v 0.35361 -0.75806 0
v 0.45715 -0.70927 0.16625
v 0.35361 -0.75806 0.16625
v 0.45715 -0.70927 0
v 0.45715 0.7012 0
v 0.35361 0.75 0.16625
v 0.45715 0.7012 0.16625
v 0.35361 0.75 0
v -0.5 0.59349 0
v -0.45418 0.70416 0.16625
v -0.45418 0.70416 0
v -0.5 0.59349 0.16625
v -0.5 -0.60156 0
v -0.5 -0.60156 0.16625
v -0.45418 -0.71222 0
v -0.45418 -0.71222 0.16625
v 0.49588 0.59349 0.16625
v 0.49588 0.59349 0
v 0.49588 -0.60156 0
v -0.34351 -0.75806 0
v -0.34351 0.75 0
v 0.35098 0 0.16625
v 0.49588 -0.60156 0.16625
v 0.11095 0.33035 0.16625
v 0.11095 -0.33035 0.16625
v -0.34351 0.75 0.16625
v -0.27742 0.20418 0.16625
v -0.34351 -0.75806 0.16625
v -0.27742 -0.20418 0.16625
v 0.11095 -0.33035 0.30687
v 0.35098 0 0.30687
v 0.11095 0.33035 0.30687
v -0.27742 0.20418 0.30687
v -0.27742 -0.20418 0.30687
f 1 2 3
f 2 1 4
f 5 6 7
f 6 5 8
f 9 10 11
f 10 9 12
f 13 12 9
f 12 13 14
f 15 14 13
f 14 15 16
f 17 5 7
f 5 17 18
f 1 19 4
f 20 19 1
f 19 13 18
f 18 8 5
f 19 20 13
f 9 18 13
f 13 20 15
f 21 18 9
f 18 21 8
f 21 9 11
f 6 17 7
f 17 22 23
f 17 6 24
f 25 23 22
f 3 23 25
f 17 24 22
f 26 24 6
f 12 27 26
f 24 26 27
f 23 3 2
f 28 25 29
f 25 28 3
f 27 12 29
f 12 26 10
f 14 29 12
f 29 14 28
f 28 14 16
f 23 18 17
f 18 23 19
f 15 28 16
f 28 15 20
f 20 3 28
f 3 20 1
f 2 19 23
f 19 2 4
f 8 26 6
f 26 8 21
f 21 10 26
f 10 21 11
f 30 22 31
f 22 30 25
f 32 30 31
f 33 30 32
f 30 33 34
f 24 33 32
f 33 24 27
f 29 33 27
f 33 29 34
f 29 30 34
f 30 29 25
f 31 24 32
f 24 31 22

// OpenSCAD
EPS = 0.01;

// Sketch 0
module sketch0() {
    difference() {
        union() {
            polygon(points=[
                [0.0, 0.0],
                [0.04583682527976966, -0.11065988524654614],
                [0.1564967105263158, -0.1564967105263158],
                [0.8536184210526316, -0.1564967105263158],
                [0.9571648194570725, -0.1077133825207835],
                [0.995888157894737, 0.0],
                [0.995888157894737, 1.1950657894736842],
                [0.9571648194570725, 1.3027791719944677],
                [0.8536184210526316, 1.3515625],
                [0.1564967105263158, 1.3515625],
                [0.04583682527976966, 1.3057256747202304],
                [0.0, 1.1950657894736842],
                [0.0, 0.0]
            ]);
            translate([0.4979440789473685, 0.5975328947368421, 0])
                circle(r=0.2560855263157895);
        }
    }
}

// Sketch 1
module sketch1() {
    difference() {
        translate([0, 0, 0.15625]) {
            union() {
                translate([0.34736842105263155, 0, 0])
                    circle(r=0.34736842105263155);
            }
            translate([0.34736842105263155, 0, 0])
                circle(r=0.24605263157894736);
        }
    }
}

// Solid 0
module solid0() {
    translate([-0.5, -0.6015625, 0])
        linear_extrude(height=0.15625 + EPS)
            sketch0();
}

// Solid 1
module solid1() {
    translate([-0.34375, 0, 0.15625])
        linear_extrude(height=0.140625 + EPS)
            sketch1();
}

// Final Solid
union() {
    solid0();
    solid1();
}
